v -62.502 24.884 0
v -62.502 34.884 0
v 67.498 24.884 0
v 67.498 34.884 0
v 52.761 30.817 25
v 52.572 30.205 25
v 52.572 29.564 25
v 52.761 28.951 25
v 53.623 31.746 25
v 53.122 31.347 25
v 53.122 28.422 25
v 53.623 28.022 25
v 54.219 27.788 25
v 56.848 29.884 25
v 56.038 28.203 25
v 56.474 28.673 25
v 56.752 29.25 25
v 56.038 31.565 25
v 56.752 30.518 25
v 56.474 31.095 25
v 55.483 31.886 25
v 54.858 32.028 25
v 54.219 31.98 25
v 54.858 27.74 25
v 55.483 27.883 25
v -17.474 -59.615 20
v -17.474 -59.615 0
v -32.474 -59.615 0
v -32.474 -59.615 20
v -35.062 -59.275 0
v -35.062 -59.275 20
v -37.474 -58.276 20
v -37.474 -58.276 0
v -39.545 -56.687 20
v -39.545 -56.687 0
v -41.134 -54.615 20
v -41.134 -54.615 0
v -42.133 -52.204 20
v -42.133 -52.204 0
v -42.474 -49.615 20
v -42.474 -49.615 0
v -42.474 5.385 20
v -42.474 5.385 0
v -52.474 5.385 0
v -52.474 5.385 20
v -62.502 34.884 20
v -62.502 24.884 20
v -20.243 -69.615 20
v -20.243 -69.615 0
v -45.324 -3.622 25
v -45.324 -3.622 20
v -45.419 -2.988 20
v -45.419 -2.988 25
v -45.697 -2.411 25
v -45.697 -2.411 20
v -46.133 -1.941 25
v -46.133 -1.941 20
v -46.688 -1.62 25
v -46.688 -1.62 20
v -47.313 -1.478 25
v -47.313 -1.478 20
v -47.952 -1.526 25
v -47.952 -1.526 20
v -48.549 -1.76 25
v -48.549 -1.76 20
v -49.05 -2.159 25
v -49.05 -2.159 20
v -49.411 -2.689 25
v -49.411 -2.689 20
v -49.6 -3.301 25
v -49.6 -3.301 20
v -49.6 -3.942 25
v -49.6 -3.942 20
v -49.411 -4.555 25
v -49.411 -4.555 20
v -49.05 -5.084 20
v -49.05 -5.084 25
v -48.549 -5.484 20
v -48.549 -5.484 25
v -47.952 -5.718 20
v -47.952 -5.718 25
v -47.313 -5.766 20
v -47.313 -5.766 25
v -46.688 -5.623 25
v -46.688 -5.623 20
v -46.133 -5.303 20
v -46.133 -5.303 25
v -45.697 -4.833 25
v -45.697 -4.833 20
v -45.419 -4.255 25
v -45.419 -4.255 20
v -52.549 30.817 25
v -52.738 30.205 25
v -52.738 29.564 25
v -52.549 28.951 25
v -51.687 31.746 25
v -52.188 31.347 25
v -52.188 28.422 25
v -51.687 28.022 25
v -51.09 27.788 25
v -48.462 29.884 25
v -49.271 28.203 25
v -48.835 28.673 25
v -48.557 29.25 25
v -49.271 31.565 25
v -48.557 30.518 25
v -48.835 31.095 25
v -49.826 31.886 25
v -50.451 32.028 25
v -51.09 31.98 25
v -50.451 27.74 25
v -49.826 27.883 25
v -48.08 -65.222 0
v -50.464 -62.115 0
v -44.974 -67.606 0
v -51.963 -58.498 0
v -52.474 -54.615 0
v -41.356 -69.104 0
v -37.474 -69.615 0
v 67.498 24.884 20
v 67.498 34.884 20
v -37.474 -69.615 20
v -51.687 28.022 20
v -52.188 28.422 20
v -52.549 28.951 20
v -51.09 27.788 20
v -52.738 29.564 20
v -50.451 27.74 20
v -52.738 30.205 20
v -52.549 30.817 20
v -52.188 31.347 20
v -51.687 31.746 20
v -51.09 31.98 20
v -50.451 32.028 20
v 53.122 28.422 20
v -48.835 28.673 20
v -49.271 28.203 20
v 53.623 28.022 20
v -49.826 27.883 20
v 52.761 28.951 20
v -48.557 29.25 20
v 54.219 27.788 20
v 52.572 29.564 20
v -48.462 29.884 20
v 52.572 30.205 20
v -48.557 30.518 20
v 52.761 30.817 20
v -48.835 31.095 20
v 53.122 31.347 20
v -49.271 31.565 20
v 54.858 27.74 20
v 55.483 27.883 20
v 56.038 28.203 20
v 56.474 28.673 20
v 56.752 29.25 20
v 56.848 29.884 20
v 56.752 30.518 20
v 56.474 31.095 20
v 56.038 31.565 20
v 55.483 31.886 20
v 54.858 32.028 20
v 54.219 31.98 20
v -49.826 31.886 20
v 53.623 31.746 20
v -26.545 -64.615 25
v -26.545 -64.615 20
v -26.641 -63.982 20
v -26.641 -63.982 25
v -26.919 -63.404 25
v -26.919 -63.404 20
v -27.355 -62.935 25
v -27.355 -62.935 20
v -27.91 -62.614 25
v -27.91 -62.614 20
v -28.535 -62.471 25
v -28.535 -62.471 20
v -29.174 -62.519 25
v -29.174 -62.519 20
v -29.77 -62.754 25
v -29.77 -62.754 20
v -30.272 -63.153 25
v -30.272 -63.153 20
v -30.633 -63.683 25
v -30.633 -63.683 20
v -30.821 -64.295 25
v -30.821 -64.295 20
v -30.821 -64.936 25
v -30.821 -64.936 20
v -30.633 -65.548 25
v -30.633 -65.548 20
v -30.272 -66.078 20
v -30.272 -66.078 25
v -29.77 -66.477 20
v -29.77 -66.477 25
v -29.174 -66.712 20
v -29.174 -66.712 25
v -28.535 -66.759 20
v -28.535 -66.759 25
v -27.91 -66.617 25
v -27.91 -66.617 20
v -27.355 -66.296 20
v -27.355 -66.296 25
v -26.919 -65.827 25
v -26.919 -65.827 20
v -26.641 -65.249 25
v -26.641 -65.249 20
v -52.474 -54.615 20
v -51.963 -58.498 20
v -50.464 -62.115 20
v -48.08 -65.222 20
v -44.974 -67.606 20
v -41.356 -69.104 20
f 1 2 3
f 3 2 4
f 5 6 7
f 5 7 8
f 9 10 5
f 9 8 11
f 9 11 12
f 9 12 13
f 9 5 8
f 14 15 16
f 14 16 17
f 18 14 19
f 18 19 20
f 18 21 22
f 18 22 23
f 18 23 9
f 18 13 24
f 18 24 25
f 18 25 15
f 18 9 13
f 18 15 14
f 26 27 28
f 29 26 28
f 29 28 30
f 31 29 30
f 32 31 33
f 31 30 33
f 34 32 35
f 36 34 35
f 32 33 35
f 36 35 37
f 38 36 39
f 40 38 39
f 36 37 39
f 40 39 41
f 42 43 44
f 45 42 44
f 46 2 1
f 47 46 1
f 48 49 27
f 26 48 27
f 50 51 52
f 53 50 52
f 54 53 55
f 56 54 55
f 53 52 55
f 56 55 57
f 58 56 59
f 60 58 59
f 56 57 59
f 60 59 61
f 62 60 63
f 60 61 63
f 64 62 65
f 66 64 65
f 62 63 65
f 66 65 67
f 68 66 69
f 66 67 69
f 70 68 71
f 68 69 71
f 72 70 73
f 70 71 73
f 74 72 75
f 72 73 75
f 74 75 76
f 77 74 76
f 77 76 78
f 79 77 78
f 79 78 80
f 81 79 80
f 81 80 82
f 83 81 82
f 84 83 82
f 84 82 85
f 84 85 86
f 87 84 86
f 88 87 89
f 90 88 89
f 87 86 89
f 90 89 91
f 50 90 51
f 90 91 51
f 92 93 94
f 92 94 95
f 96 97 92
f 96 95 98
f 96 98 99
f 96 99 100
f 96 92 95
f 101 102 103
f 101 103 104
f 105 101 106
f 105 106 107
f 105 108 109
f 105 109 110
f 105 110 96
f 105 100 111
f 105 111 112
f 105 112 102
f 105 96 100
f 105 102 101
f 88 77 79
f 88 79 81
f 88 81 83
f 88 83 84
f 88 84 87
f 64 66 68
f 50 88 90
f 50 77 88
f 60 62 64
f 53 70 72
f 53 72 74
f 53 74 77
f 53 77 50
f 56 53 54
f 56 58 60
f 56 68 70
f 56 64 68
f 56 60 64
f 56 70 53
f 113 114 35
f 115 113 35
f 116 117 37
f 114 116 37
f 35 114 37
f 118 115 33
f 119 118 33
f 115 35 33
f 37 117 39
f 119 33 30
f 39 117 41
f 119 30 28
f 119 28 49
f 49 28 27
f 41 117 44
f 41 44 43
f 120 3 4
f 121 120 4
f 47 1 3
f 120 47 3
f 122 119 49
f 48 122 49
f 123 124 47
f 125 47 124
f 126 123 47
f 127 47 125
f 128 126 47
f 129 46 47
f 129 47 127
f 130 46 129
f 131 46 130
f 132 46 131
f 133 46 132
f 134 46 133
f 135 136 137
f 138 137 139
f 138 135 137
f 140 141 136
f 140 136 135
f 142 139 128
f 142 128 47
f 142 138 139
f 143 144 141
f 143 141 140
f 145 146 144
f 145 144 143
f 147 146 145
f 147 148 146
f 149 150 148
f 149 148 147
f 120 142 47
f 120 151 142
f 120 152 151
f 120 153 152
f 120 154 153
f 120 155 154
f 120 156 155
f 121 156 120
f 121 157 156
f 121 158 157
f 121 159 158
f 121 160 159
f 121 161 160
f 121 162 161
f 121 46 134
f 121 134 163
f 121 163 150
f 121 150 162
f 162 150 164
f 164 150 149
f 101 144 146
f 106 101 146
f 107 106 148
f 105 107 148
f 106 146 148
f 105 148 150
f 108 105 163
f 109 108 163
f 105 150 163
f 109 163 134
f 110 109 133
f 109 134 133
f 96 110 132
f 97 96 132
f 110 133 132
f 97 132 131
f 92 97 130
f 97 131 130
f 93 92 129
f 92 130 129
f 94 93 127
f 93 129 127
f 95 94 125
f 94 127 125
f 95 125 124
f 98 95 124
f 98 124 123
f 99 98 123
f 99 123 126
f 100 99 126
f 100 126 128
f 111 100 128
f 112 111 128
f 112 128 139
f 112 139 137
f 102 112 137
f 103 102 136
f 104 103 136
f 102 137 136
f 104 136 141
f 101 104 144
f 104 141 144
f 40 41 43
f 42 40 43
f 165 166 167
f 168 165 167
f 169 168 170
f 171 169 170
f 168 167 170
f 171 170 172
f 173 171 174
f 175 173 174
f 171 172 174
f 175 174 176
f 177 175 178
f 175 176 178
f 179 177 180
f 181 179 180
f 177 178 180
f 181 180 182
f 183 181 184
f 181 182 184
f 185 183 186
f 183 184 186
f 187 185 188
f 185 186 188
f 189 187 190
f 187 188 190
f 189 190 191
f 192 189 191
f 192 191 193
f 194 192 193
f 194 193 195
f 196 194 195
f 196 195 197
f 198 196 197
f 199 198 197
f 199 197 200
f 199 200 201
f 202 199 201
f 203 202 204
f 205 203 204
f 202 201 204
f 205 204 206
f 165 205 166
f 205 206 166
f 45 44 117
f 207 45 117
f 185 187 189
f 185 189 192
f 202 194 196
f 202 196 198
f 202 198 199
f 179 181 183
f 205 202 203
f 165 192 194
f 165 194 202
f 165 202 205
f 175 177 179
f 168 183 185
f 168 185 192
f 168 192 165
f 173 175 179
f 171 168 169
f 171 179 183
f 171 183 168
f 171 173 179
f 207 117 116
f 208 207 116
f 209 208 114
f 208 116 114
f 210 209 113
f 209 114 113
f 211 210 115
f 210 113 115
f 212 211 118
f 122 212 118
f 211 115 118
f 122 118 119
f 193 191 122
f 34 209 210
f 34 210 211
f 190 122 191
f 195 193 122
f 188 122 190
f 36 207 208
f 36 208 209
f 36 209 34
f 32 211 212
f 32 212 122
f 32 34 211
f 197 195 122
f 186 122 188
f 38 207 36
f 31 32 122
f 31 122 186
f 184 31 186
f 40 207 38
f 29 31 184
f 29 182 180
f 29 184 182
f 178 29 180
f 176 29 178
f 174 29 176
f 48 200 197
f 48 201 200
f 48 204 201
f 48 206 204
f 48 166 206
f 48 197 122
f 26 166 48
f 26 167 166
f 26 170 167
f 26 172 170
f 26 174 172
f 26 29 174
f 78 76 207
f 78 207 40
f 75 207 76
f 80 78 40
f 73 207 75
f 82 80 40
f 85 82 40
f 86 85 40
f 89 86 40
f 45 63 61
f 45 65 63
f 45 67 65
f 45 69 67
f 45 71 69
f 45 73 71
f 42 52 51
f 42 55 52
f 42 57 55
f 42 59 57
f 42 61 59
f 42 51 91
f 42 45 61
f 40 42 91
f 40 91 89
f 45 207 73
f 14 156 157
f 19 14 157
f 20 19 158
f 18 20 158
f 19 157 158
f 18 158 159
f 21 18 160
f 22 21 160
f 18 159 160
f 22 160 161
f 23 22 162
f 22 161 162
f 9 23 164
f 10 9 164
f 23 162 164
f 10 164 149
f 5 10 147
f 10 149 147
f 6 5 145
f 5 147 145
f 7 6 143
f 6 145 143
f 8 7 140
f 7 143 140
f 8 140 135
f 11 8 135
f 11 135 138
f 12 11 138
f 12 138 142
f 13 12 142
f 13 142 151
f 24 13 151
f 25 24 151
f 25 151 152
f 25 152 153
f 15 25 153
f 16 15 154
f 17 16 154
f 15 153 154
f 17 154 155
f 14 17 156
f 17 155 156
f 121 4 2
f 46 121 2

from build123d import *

# Parameters (mm, degrees)
F1_DEPTH = 20
F2_DEPTH = 20
F3_R     = 2.15
F4_DEPTH = 5
F5_R     = 2.15
F6_DEPTH = 5


with BuildPart() as f1:
    # F0 (on Top) → F1 (new body)
    with BuildSketch(Plane.XY):
        Polygon((-47.501586, 34.884202), (-62.501586, 34.884202), (-62.501586, 24.884202), (67.498414, 24.884202), (67.498414, 29.884202), (67.498414, 34.884202), (52.498414, 34.884202), align=None)
    extrude(amount=F1_DEPTH)

    # F3 (on face) → F4 (join)
    with BuildSketch(Plane.XY.offset(20)):
        with Locations((-50.611738, 29.884202)):
            Circle(F3_R)
        with Locations((54.697819, 29.884202)):
            Circle(F3_R)
    extrude(amount=F4_DEPTH)


with BuildPart() as f2:
    # F0 (on Top) → F2 (new body)
    with BuildSketch(Plane.XY):
        with BuildLine():
            Line((-42.473806, -49.615479), (-42.473806, 5.384521))
            Line((-42.473806, 5.384521), (-52.473806, 5.384521))
            Line((-52.473806, 5.384521), (-52.473806, -54.615479))
            ThreePointArc((-52.473806, -54.615479), (-48.080408, -65.222081), (-37.473806, -69.615479))
            Line((-37.473806, -69.615479), (-20.242885, -69.615479))
            Line((-20.242885, -69.615479), (-17.473806, -59.615479))
            Line((-17.473806, -59.615479), (-32.473806, -59.615479))
            ThreePointArc((-32.473806, -59.615479), (-39.544874, -56.686547), (-42.473806, -49.615479))
        make_face()
    extrude(amount=F2_DEPTH)

    # F5 (on face) → F6 (join)
    with BuildSketch(Plane.XY.offset(20)):
        with Locations((-47.473806, -3.621757)):
            Circle(F5_R)
        with Locations((-28.69546, -64.615479)):
            Circle(F5_R)
    extrude(amount=F6_DEPTH)


solid = Compound([f1.part, f2.part])
